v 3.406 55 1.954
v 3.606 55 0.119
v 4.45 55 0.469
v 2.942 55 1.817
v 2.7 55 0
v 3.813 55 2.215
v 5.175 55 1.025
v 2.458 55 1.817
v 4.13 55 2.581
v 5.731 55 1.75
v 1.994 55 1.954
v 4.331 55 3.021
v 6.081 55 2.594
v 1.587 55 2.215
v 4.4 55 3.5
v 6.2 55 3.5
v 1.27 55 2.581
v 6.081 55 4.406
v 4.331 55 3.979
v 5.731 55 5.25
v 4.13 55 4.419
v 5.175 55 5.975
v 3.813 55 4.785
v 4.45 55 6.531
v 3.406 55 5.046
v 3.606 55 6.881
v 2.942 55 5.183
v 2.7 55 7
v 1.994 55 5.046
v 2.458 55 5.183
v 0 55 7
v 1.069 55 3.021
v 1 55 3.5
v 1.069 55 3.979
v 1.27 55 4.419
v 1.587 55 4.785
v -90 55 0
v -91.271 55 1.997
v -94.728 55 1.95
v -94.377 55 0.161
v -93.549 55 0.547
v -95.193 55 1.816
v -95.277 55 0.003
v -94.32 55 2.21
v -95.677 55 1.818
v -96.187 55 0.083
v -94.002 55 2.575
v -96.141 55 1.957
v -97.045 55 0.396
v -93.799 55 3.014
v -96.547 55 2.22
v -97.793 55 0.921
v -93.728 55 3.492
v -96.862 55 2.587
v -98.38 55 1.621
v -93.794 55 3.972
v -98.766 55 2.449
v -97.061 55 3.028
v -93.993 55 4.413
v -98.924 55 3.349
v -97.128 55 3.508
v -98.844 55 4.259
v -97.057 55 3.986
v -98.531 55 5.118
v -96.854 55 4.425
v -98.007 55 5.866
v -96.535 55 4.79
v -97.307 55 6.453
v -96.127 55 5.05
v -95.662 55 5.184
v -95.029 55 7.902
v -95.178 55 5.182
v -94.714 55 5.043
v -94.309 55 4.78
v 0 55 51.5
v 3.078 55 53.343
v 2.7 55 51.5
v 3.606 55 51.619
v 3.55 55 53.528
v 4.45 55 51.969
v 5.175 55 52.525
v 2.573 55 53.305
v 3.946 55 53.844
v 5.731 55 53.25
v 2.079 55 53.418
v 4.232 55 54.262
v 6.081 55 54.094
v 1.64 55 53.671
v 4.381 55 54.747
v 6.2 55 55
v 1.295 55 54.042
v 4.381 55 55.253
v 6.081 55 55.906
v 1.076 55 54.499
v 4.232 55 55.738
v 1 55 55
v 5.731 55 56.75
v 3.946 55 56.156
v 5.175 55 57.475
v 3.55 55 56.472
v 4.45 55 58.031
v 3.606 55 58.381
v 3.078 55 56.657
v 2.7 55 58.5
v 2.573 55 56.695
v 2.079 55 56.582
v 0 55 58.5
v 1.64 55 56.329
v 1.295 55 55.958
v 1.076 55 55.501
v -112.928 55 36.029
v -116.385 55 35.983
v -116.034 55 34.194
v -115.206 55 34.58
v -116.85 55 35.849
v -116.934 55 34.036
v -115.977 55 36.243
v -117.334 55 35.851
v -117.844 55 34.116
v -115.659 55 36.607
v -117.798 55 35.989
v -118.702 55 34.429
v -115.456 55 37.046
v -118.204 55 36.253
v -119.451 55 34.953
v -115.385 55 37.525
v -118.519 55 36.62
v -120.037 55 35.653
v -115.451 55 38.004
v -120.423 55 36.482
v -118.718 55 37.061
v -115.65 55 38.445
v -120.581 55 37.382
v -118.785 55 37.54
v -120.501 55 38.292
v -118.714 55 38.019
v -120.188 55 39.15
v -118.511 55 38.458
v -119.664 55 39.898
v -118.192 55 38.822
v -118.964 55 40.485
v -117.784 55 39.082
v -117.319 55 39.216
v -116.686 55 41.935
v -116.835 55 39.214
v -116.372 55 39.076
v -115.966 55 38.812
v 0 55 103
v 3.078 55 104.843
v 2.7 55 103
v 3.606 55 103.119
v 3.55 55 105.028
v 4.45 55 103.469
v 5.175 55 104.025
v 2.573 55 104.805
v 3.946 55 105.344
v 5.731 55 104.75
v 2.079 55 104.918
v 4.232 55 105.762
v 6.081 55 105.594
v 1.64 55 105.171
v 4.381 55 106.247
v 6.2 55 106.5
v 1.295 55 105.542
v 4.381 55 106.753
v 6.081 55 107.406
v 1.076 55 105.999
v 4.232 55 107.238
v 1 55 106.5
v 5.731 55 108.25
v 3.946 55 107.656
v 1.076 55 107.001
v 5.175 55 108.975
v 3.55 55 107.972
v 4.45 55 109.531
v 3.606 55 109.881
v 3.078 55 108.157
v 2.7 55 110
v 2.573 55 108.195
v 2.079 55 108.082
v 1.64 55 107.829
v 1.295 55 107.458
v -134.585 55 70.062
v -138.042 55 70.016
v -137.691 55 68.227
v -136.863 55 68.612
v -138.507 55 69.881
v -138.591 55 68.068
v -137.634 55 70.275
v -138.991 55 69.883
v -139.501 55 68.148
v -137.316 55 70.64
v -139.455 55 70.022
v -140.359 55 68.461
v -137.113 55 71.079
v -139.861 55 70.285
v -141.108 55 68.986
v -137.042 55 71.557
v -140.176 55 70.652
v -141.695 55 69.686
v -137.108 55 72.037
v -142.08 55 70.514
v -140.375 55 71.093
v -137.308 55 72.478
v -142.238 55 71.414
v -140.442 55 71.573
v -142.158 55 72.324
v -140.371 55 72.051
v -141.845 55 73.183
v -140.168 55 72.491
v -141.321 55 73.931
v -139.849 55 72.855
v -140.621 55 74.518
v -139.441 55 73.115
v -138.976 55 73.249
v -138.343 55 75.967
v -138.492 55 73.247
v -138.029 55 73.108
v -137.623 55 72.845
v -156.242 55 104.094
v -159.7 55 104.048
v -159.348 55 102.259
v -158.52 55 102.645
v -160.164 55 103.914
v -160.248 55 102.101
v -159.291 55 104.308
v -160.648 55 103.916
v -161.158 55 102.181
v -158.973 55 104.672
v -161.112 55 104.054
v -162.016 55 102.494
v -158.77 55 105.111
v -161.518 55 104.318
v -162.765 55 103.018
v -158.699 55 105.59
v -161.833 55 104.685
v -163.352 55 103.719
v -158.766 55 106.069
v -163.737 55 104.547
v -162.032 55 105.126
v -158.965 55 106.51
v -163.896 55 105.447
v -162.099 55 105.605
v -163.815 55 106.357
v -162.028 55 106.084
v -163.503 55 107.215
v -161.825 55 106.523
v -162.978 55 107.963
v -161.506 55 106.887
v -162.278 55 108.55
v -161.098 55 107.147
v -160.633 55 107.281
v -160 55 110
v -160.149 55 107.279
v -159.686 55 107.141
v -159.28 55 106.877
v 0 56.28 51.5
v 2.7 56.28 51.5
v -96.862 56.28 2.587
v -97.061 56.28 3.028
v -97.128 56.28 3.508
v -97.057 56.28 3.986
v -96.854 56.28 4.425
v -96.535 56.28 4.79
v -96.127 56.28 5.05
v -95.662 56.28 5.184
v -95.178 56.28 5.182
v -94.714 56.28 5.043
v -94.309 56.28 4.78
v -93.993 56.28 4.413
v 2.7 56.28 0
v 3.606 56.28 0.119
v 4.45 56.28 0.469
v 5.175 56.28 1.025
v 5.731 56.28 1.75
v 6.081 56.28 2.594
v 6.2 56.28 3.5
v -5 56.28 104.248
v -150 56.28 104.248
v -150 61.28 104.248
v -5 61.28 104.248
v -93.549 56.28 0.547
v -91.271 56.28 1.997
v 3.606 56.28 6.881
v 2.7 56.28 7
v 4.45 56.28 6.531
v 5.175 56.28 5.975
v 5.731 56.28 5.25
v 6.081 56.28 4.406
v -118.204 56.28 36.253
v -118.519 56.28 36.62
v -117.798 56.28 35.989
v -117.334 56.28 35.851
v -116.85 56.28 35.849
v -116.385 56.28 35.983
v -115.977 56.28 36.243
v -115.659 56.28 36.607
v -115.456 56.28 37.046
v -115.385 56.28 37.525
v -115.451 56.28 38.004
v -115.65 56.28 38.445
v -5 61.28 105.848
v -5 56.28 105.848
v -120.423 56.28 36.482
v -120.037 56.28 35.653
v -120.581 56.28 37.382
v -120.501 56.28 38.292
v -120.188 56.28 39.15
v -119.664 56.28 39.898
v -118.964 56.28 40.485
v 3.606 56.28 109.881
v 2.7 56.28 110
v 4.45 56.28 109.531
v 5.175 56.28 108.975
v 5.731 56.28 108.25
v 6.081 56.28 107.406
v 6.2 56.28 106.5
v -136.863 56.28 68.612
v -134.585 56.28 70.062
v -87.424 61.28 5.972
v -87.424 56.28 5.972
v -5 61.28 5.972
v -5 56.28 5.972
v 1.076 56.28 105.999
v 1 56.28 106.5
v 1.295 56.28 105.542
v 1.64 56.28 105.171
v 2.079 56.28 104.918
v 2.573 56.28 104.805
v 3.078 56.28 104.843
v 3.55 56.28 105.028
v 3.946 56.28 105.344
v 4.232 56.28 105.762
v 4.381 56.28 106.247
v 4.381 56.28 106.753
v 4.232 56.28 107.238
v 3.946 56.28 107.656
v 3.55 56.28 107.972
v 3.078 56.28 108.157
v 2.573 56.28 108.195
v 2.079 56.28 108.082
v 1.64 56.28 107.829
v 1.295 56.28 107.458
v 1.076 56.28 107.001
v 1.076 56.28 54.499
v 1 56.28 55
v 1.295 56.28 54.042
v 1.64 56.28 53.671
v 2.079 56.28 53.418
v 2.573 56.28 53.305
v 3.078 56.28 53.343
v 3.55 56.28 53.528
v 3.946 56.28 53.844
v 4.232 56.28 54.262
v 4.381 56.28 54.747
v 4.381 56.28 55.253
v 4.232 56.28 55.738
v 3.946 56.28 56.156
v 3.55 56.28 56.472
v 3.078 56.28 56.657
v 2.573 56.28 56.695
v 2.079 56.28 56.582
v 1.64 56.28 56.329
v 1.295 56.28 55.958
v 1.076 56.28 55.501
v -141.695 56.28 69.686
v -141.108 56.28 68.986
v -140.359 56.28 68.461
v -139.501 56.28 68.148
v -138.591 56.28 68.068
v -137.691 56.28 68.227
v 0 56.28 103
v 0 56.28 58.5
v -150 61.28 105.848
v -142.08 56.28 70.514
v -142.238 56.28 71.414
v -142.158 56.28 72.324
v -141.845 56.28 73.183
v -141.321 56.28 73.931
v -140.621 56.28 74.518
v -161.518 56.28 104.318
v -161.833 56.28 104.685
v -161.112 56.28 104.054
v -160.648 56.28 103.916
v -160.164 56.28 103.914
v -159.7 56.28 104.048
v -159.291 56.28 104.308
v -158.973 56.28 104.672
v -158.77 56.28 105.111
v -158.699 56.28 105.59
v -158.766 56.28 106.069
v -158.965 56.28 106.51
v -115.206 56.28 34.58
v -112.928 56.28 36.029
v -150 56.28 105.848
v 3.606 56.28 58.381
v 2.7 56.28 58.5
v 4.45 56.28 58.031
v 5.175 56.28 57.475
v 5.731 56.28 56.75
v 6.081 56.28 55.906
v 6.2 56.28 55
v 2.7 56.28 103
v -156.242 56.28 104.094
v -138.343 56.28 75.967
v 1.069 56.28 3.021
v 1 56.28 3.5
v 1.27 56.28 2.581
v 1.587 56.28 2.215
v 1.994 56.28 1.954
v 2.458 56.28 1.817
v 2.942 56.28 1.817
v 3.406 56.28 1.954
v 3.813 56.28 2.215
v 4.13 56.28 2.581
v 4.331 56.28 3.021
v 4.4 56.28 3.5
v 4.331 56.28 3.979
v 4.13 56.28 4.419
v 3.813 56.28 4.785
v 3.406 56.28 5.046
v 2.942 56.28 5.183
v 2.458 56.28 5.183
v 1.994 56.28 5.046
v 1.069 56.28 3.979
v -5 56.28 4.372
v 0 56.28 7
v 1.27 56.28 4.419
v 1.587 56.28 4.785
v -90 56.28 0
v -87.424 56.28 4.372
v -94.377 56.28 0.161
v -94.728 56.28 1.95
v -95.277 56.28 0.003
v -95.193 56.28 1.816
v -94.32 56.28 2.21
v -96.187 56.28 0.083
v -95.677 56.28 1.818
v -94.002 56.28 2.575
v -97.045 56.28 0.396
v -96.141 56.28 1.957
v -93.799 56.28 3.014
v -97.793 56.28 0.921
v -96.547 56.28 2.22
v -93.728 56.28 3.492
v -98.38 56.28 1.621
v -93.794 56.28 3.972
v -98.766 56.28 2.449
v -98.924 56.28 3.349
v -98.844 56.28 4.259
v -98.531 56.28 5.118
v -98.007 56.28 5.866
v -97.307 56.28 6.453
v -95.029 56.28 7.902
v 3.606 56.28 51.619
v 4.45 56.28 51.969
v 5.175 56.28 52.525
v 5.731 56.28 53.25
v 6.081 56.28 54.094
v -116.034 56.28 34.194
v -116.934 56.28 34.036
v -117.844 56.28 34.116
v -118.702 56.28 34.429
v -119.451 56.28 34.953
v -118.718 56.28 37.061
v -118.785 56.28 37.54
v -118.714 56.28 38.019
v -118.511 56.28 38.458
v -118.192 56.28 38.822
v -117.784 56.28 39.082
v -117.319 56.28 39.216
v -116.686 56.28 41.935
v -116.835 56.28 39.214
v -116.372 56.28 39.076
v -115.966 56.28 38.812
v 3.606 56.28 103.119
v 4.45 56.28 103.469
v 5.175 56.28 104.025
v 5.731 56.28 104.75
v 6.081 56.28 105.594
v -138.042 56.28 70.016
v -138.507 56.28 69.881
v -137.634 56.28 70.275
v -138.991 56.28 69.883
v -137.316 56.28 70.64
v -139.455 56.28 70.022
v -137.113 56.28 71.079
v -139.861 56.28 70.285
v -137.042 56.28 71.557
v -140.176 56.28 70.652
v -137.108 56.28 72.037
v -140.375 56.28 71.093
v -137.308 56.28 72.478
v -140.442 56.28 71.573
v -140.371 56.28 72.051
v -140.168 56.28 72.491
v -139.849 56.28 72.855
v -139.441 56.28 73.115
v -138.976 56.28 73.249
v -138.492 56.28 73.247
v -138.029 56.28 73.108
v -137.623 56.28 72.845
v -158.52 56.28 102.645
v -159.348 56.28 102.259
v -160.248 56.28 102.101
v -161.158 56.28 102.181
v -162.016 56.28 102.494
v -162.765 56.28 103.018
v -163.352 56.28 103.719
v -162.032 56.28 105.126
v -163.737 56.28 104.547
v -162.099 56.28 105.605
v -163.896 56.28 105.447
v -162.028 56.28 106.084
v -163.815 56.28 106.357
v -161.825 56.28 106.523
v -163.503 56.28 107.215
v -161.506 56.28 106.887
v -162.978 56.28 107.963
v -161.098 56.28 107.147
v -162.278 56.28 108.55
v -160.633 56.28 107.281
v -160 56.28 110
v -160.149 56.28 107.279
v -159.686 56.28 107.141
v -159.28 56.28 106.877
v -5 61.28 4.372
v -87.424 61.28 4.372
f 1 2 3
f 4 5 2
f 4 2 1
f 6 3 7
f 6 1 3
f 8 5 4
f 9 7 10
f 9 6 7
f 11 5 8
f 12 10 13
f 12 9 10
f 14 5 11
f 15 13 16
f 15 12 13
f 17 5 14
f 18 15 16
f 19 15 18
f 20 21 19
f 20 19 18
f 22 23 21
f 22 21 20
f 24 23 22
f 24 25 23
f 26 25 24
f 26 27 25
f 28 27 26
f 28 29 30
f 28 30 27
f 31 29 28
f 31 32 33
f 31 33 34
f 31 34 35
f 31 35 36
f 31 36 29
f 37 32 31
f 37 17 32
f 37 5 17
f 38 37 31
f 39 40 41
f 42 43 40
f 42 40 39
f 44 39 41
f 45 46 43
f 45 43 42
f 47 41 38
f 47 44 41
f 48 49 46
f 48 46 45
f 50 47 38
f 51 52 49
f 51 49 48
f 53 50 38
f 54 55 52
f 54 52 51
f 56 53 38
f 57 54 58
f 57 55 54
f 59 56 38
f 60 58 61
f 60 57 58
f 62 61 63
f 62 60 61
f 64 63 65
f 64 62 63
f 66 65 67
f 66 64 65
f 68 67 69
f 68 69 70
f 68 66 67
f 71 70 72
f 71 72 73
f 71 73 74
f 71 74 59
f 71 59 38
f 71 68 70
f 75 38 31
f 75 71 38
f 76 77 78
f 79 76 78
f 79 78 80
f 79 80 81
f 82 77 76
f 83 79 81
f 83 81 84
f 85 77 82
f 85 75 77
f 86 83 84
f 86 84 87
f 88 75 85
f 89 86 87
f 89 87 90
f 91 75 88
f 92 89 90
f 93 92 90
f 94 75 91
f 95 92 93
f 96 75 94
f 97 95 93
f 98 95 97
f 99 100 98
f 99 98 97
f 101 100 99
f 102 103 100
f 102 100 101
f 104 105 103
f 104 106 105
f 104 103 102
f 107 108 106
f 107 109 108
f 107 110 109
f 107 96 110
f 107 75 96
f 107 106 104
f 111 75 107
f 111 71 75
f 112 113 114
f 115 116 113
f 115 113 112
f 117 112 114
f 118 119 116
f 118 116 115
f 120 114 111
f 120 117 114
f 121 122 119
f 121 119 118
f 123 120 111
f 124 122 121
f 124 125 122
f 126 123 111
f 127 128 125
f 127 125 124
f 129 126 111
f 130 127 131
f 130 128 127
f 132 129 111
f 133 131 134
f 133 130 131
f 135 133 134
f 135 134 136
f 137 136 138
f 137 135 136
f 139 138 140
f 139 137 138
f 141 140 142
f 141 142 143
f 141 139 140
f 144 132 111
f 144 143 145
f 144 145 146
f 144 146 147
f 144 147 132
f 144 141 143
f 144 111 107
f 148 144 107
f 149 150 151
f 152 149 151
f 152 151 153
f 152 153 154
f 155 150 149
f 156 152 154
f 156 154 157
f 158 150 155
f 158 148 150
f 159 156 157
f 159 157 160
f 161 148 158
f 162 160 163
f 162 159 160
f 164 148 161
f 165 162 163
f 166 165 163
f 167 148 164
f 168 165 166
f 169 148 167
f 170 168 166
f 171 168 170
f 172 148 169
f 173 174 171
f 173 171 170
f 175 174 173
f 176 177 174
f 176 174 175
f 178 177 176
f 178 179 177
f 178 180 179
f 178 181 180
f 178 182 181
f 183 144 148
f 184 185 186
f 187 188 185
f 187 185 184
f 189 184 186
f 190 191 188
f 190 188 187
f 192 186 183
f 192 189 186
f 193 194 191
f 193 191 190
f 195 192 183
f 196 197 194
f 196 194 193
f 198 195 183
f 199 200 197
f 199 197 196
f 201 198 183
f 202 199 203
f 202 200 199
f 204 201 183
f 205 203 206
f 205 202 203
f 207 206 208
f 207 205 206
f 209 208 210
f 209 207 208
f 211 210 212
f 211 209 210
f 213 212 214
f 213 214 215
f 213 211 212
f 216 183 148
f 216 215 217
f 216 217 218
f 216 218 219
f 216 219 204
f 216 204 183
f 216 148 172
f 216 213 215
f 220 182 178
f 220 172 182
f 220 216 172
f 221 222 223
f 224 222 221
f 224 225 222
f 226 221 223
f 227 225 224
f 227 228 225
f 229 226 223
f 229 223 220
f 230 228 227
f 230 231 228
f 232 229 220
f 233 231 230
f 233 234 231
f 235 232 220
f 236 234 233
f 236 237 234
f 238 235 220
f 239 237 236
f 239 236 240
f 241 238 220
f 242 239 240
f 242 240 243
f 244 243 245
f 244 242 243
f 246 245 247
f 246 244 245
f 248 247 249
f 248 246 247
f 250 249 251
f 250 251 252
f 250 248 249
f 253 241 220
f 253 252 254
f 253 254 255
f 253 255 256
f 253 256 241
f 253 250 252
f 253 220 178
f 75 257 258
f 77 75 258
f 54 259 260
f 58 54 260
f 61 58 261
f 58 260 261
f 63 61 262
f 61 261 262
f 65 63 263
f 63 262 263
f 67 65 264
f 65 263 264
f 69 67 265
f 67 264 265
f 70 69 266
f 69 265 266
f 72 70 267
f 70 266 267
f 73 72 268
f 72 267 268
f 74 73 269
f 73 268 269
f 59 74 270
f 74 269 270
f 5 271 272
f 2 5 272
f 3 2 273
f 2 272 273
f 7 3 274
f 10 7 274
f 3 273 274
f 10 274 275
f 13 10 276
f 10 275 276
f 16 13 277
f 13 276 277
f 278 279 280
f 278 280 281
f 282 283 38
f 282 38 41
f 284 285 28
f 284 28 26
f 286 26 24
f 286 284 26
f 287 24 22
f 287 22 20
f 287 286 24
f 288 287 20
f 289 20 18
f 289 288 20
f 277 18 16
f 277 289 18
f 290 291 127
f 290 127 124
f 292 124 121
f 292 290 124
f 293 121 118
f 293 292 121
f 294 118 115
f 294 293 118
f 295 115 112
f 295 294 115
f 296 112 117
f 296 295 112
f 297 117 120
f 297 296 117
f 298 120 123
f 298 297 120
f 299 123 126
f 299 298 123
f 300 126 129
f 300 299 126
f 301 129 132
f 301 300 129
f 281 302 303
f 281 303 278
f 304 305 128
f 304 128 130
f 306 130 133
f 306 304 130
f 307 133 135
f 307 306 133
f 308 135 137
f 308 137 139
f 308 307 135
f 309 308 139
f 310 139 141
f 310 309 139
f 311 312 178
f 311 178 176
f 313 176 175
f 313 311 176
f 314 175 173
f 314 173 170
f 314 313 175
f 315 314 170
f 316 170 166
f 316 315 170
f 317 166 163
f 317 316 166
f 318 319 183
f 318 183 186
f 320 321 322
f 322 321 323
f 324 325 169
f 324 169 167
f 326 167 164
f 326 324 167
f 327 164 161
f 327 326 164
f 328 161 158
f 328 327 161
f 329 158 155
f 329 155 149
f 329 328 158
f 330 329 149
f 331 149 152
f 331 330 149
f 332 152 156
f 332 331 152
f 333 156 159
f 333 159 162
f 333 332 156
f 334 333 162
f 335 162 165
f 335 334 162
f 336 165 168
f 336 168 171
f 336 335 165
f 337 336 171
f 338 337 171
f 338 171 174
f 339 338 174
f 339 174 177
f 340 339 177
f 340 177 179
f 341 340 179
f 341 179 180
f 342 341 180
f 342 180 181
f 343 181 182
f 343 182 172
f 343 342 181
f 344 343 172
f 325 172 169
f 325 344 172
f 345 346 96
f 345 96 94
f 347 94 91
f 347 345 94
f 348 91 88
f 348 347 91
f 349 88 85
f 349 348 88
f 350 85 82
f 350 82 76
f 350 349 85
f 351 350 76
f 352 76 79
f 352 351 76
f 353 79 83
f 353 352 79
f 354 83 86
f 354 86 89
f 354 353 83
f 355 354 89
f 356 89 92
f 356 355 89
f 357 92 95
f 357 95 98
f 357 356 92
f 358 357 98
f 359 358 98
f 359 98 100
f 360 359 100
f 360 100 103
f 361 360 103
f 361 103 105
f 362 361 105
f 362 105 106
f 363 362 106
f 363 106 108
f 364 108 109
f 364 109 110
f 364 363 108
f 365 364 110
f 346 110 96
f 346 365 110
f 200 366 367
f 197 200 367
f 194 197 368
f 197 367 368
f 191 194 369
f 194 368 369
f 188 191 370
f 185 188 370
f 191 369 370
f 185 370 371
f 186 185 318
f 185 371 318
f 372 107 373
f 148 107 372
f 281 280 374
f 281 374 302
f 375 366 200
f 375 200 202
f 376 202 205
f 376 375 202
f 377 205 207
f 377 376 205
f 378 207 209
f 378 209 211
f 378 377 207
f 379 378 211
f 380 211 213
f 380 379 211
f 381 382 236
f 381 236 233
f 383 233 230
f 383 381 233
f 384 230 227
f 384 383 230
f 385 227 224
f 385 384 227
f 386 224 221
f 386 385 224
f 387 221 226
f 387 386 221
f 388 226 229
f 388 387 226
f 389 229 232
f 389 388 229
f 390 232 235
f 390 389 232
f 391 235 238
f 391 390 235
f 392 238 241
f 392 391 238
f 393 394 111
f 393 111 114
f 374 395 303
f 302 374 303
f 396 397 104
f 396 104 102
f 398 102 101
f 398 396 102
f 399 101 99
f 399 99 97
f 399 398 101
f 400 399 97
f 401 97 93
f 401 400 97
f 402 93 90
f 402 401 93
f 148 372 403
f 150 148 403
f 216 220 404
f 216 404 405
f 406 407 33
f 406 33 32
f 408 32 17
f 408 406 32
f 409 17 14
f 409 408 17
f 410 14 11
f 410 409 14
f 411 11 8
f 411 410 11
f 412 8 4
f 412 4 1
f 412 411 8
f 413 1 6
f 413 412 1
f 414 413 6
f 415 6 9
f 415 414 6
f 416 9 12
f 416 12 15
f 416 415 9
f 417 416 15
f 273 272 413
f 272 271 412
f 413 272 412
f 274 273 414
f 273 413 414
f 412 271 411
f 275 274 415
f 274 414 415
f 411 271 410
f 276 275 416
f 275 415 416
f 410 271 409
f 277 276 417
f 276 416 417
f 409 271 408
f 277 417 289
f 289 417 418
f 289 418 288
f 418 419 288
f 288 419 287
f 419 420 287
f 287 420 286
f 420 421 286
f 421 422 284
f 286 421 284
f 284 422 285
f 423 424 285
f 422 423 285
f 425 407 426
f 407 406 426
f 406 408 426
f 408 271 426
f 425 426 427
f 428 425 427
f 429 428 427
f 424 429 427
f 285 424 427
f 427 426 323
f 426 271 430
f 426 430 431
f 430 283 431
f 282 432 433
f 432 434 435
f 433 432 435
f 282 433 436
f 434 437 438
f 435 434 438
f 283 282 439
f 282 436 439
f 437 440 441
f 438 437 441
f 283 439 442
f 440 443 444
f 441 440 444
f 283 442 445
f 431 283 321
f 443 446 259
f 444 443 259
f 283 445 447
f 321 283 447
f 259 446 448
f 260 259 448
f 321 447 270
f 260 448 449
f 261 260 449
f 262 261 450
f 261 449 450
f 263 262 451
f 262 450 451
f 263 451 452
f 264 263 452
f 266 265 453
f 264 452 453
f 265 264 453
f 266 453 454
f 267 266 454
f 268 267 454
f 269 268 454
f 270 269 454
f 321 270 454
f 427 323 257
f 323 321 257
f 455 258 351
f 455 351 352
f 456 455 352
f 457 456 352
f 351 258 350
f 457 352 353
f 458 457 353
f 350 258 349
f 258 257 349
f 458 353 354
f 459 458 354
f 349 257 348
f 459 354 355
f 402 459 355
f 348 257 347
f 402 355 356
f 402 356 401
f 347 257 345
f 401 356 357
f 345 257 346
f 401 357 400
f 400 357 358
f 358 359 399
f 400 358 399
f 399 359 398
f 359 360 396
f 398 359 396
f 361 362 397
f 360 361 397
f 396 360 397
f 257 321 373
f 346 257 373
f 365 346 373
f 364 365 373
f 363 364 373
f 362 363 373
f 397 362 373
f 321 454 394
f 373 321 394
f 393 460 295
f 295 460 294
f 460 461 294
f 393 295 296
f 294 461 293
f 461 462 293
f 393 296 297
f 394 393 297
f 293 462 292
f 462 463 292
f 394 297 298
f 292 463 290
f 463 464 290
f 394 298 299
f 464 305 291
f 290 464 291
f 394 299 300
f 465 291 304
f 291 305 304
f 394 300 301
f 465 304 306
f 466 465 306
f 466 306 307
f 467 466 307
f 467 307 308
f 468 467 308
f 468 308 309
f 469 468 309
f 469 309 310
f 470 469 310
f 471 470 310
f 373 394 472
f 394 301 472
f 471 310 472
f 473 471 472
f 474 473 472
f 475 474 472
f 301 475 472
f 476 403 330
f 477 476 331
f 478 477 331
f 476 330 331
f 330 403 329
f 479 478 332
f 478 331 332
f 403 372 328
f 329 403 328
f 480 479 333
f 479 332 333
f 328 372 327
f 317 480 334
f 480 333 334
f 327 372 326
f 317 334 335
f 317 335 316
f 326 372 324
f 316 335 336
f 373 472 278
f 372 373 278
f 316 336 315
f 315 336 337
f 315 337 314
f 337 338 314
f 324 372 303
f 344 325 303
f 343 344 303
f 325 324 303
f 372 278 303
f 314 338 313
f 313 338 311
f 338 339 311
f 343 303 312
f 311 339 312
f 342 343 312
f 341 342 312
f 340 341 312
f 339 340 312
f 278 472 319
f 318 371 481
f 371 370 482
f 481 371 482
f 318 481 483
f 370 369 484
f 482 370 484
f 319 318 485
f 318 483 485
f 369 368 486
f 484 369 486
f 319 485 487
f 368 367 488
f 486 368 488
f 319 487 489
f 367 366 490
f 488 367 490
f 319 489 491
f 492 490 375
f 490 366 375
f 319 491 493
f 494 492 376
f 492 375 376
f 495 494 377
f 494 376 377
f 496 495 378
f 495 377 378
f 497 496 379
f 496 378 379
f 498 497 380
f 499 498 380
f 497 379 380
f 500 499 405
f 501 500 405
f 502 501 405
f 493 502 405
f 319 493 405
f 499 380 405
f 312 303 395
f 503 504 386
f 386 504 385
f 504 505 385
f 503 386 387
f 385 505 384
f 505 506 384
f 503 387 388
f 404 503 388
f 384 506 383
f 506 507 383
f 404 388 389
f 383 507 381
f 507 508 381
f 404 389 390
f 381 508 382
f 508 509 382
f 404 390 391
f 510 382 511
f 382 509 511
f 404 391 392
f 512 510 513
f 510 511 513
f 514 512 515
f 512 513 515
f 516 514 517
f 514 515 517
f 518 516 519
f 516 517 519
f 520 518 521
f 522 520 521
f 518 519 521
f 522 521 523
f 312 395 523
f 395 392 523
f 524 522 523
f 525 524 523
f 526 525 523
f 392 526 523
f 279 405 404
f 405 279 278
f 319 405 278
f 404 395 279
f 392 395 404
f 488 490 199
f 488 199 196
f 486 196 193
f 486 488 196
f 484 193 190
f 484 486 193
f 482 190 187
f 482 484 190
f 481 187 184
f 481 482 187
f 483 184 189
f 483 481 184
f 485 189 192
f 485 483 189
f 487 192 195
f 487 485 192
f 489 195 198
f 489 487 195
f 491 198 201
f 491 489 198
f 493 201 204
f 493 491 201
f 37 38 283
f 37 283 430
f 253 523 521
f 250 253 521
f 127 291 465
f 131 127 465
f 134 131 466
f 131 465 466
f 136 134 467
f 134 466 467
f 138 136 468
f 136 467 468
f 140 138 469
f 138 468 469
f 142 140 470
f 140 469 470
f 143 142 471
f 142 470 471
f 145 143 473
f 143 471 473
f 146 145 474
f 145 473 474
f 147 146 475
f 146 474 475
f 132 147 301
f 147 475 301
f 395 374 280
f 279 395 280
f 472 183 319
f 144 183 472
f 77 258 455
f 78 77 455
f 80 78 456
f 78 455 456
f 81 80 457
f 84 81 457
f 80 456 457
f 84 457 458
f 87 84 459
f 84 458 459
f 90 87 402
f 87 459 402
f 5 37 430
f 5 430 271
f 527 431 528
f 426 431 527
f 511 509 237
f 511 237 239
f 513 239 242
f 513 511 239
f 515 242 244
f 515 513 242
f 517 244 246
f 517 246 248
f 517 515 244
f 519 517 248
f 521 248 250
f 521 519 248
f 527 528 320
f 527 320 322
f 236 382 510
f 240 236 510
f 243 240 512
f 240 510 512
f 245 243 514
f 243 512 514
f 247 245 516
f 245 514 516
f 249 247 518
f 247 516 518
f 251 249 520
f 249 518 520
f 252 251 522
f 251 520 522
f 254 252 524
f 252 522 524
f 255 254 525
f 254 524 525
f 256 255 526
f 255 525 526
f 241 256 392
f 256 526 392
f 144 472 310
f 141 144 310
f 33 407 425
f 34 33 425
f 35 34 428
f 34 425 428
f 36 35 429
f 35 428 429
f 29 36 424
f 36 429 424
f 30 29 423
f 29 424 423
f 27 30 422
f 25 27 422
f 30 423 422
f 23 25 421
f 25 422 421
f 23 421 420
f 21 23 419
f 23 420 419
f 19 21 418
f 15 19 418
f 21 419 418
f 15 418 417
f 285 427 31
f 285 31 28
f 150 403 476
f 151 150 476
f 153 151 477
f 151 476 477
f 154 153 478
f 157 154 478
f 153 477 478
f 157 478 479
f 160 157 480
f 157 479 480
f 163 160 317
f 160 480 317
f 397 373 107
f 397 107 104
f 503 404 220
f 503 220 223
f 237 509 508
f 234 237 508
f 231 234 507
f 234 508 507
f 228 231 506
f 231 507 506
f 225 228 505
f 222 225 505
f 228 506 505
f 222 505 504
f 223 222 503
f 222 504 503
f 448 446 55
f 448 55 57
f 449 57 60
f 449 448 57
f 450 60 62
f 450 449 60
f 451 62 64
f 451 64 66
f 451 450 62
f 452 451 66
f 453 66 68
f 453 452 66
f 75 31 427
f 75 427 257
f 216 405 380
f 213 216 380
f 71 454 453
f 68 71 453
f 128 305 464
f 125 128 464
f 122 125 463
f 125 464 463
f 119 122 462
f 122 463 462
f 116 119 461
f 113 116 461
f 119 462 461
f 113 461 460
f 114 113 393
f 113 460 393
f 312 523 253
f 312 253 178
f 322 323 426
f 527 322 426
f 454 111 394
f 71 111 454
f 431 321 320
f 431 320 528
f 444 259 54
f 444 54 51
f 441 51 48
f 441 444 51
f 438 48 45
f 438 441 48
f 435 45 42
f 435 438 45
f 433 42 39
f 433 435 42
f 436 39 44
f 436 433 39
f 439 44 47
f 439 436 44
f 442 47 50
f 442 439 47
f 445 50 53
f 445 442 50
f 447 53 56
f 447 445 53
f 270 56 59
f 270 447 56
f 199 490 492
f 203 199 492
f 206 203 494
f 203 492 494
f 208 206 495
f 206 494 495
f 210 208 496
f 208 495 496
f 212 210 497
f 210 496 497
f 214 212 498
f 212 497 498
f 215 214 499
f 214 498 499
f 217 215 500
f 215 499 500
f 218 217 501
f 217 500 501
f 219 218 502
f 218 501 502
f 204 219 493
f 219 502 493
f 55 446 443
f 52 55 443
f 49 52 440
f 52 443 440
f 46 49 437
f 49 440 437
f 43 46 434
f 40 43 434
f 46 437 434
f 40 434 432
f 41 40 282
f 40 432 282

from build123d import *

# Parameters (mm, degrees)
PAD_DEPTH                  = 1.28
SKETCH005_W                = 145
SKETCH005_H                = 1.6
SKETCH005_W_2              = 82.424179
PAD003_DEPTH               = 5
PAD004_DEPTH               = 1.28
PAD004_MIRRORED_2_DEPTH    = 1.28
LINEARPATTERN_COUNT        = 3
LINEARPATTERN_PITCH        = 51.5
PAD005_DEPTH               = 1.28
PAD005_MIRRORED001_2_DEPTH = 1.28
LINEARPATTERN001_COUNT     = 4
LINEARPATTERN001_PITCH     = 40.3390943124


with BuildPart() as part:
    # Sketch → Pad (new body)
    with BuildSketch(Plane.XZ):
        Polygon((0, 0), (0, 110), (-160, 110), (-90, 0), align=None)
    extrude(amount=-PAD_DEPTH)

    # Sketch005 (on Face6 of Pad) → Pad003 (join)
    with BuildSketch(Plane(origin=(0, 1.28, 0), x_dir=(1, 0, 0), z_dir=(0, 1, 0))):
        with Locations((-77.5, -105.0479535608)):
            Rectangle(SKETCH005_W, SKETCH005_H)
        with Locations((-46.2120895, -5.171919)):
            Rectangle(SKETCH005_W_2, SKETCH005_H)
    extrude(amount=PAD003_DEPTH)

    # Sketch006 (on Face5 of Pad003) → Pad004 (join)
    with BuildSketch(Plane(origin=(0, 1.28, 0), x_dir=(1, 0, 0), z_dir=(0, 1, 0))):
        with BuildLine():
            Line((0, -110), (0, -106.5))
            Line((0, -106.5), (1, -106.5))
            ThreePointArc((1, -106.5), (2.7, -108.2), (4.4, -106.5))
            Line((4.4, -106.5), (6.2, -106.5))
            ThreePointArc((2.6999832282, -110), (5.1748678044, -108.9748796639), (6.2, -106.5))
            Line((0, -110), (2.6999832282, -110))
        make_face()
    pad004 = extrude(amount=-PAD004_DEPTH)

    # Sketch006 Mirrored 2 → Pad004 Mirrored 2 (add)
    with BuildSketch(Plane(origin=(0, 1.28, 213), x_dir=(1, 0, 0), z_dir=(0, -1, 0))):
        with BuildLine():
            Line((0, -110), (0, -106.5))
            Line((0, -106.5), (1, -106.5))
            ThreePointArc((1, -106.5), (2.7, -108.2), (4.4, -106.5))
            Line((4.4, -106.5), (6.2, -106.5))
            ThreePointArc((2.6999832282, -110), (5.1748678044, -108.9748796639), (6.2, -106.5))
            Line((0, -110), (2.6999832282, -110))
        make_face()
    pad004_mirrored_2 = extrude(amount=PAD004_MIRRORED_2_DEPTH)

    # LinearPattern: Pad004, Pad004 Mirrored 2 ×3
    with Locations(*[(0, 0, -i * LINEARPATTERN_PITCH) for i in range(1, LINEARPATTERN_COUNT)]):
        add(pad004)
        add(pad004_mirrored_2)

    # Sketch007 (on Face5 of Pad003) → Pad005 (join)
    with BuildSketch(Plane(origin=(0, 1.28, 0), x_dir=(1, 0, 0), z_dir=(0, 1, 0))):
        with BuildLine():
            Line((-160, -110), (-158.1209357773, -107.0471847929))
            Line((-158.1209357773, -107.0471847929), (-158.9645972651, -106.5103093007))
            ThreePointArc((-161.8330463233, -104.6849326273), (-161.3115101309, -107.0318454932), (-158.9645972651, -106.5103093007))
            Line((-161.8330463233, -104.6849326273), (-163.3516370013, -103.7185567413))
            ThreePointArc((-163.3516370013, -103.7185567413), (-163.8154739704, -106.3568889713), (-162.2778663036, -108.5504487158))
            Line((-160, -110), (-162.2778663036, -108.5504487159))
        make_face()
    pad005 = extrude(amount=-PAD005_DEPTH)

    # Sketch007 Mirrored001 2 → Pad005 Mirrored001 2 (add)
    with BuildSketch(Plane(origin=(-188.1242244958, 1.28, 295.6237813506), x_dir=(0.4235294118, 0, 0.9058823529), z_dir=(0, -1, 0))):
        with BuildLine():
            Line((-160, -110), (-158.1209357773, -107.0471847929))
            Line((-158.1209357773, -107.0471847929), (-158.9645972651, -106.5103093007))
            ThreePointArc((-161.8330463233, -104.6849326273), (-161.3115101309, -107.0318454932), (-158.9645972651, -106.5103093007))
            Line((-161.8330463233, -104.6849326273), (-163.3516370013, -103.7185567413))
            ThreePointArc((-163.3516370013, -103.7185567413), (-163.8154739704, -106.3568889713), (-162.2778663036, -108.5504487158))
            Line((-160, -110), (-162.2778663036, -108.5504487159))
        make_face()
    pad005_mirrored001_2 = extrude(amount=PAD005_MIRRORED001_2_DEPTH)

    # LinearPattern001: Pad005, Pad005 Mirrored001 2 ×4
    with Locations(*[Vector(0.5368754922, 0, -0.8436614877) * (i * LINEARPATTERN001_PITCH) for i in range(1, LINEARPATTERN001_COUNT)]):
        add(pad005)
        add(pad005_mirrored001_2)


with BuildPart() as part_1:
    # Body placement: moved
    add(part.part.moved(Location((0, 55, 0))))


solid = part_1.part
